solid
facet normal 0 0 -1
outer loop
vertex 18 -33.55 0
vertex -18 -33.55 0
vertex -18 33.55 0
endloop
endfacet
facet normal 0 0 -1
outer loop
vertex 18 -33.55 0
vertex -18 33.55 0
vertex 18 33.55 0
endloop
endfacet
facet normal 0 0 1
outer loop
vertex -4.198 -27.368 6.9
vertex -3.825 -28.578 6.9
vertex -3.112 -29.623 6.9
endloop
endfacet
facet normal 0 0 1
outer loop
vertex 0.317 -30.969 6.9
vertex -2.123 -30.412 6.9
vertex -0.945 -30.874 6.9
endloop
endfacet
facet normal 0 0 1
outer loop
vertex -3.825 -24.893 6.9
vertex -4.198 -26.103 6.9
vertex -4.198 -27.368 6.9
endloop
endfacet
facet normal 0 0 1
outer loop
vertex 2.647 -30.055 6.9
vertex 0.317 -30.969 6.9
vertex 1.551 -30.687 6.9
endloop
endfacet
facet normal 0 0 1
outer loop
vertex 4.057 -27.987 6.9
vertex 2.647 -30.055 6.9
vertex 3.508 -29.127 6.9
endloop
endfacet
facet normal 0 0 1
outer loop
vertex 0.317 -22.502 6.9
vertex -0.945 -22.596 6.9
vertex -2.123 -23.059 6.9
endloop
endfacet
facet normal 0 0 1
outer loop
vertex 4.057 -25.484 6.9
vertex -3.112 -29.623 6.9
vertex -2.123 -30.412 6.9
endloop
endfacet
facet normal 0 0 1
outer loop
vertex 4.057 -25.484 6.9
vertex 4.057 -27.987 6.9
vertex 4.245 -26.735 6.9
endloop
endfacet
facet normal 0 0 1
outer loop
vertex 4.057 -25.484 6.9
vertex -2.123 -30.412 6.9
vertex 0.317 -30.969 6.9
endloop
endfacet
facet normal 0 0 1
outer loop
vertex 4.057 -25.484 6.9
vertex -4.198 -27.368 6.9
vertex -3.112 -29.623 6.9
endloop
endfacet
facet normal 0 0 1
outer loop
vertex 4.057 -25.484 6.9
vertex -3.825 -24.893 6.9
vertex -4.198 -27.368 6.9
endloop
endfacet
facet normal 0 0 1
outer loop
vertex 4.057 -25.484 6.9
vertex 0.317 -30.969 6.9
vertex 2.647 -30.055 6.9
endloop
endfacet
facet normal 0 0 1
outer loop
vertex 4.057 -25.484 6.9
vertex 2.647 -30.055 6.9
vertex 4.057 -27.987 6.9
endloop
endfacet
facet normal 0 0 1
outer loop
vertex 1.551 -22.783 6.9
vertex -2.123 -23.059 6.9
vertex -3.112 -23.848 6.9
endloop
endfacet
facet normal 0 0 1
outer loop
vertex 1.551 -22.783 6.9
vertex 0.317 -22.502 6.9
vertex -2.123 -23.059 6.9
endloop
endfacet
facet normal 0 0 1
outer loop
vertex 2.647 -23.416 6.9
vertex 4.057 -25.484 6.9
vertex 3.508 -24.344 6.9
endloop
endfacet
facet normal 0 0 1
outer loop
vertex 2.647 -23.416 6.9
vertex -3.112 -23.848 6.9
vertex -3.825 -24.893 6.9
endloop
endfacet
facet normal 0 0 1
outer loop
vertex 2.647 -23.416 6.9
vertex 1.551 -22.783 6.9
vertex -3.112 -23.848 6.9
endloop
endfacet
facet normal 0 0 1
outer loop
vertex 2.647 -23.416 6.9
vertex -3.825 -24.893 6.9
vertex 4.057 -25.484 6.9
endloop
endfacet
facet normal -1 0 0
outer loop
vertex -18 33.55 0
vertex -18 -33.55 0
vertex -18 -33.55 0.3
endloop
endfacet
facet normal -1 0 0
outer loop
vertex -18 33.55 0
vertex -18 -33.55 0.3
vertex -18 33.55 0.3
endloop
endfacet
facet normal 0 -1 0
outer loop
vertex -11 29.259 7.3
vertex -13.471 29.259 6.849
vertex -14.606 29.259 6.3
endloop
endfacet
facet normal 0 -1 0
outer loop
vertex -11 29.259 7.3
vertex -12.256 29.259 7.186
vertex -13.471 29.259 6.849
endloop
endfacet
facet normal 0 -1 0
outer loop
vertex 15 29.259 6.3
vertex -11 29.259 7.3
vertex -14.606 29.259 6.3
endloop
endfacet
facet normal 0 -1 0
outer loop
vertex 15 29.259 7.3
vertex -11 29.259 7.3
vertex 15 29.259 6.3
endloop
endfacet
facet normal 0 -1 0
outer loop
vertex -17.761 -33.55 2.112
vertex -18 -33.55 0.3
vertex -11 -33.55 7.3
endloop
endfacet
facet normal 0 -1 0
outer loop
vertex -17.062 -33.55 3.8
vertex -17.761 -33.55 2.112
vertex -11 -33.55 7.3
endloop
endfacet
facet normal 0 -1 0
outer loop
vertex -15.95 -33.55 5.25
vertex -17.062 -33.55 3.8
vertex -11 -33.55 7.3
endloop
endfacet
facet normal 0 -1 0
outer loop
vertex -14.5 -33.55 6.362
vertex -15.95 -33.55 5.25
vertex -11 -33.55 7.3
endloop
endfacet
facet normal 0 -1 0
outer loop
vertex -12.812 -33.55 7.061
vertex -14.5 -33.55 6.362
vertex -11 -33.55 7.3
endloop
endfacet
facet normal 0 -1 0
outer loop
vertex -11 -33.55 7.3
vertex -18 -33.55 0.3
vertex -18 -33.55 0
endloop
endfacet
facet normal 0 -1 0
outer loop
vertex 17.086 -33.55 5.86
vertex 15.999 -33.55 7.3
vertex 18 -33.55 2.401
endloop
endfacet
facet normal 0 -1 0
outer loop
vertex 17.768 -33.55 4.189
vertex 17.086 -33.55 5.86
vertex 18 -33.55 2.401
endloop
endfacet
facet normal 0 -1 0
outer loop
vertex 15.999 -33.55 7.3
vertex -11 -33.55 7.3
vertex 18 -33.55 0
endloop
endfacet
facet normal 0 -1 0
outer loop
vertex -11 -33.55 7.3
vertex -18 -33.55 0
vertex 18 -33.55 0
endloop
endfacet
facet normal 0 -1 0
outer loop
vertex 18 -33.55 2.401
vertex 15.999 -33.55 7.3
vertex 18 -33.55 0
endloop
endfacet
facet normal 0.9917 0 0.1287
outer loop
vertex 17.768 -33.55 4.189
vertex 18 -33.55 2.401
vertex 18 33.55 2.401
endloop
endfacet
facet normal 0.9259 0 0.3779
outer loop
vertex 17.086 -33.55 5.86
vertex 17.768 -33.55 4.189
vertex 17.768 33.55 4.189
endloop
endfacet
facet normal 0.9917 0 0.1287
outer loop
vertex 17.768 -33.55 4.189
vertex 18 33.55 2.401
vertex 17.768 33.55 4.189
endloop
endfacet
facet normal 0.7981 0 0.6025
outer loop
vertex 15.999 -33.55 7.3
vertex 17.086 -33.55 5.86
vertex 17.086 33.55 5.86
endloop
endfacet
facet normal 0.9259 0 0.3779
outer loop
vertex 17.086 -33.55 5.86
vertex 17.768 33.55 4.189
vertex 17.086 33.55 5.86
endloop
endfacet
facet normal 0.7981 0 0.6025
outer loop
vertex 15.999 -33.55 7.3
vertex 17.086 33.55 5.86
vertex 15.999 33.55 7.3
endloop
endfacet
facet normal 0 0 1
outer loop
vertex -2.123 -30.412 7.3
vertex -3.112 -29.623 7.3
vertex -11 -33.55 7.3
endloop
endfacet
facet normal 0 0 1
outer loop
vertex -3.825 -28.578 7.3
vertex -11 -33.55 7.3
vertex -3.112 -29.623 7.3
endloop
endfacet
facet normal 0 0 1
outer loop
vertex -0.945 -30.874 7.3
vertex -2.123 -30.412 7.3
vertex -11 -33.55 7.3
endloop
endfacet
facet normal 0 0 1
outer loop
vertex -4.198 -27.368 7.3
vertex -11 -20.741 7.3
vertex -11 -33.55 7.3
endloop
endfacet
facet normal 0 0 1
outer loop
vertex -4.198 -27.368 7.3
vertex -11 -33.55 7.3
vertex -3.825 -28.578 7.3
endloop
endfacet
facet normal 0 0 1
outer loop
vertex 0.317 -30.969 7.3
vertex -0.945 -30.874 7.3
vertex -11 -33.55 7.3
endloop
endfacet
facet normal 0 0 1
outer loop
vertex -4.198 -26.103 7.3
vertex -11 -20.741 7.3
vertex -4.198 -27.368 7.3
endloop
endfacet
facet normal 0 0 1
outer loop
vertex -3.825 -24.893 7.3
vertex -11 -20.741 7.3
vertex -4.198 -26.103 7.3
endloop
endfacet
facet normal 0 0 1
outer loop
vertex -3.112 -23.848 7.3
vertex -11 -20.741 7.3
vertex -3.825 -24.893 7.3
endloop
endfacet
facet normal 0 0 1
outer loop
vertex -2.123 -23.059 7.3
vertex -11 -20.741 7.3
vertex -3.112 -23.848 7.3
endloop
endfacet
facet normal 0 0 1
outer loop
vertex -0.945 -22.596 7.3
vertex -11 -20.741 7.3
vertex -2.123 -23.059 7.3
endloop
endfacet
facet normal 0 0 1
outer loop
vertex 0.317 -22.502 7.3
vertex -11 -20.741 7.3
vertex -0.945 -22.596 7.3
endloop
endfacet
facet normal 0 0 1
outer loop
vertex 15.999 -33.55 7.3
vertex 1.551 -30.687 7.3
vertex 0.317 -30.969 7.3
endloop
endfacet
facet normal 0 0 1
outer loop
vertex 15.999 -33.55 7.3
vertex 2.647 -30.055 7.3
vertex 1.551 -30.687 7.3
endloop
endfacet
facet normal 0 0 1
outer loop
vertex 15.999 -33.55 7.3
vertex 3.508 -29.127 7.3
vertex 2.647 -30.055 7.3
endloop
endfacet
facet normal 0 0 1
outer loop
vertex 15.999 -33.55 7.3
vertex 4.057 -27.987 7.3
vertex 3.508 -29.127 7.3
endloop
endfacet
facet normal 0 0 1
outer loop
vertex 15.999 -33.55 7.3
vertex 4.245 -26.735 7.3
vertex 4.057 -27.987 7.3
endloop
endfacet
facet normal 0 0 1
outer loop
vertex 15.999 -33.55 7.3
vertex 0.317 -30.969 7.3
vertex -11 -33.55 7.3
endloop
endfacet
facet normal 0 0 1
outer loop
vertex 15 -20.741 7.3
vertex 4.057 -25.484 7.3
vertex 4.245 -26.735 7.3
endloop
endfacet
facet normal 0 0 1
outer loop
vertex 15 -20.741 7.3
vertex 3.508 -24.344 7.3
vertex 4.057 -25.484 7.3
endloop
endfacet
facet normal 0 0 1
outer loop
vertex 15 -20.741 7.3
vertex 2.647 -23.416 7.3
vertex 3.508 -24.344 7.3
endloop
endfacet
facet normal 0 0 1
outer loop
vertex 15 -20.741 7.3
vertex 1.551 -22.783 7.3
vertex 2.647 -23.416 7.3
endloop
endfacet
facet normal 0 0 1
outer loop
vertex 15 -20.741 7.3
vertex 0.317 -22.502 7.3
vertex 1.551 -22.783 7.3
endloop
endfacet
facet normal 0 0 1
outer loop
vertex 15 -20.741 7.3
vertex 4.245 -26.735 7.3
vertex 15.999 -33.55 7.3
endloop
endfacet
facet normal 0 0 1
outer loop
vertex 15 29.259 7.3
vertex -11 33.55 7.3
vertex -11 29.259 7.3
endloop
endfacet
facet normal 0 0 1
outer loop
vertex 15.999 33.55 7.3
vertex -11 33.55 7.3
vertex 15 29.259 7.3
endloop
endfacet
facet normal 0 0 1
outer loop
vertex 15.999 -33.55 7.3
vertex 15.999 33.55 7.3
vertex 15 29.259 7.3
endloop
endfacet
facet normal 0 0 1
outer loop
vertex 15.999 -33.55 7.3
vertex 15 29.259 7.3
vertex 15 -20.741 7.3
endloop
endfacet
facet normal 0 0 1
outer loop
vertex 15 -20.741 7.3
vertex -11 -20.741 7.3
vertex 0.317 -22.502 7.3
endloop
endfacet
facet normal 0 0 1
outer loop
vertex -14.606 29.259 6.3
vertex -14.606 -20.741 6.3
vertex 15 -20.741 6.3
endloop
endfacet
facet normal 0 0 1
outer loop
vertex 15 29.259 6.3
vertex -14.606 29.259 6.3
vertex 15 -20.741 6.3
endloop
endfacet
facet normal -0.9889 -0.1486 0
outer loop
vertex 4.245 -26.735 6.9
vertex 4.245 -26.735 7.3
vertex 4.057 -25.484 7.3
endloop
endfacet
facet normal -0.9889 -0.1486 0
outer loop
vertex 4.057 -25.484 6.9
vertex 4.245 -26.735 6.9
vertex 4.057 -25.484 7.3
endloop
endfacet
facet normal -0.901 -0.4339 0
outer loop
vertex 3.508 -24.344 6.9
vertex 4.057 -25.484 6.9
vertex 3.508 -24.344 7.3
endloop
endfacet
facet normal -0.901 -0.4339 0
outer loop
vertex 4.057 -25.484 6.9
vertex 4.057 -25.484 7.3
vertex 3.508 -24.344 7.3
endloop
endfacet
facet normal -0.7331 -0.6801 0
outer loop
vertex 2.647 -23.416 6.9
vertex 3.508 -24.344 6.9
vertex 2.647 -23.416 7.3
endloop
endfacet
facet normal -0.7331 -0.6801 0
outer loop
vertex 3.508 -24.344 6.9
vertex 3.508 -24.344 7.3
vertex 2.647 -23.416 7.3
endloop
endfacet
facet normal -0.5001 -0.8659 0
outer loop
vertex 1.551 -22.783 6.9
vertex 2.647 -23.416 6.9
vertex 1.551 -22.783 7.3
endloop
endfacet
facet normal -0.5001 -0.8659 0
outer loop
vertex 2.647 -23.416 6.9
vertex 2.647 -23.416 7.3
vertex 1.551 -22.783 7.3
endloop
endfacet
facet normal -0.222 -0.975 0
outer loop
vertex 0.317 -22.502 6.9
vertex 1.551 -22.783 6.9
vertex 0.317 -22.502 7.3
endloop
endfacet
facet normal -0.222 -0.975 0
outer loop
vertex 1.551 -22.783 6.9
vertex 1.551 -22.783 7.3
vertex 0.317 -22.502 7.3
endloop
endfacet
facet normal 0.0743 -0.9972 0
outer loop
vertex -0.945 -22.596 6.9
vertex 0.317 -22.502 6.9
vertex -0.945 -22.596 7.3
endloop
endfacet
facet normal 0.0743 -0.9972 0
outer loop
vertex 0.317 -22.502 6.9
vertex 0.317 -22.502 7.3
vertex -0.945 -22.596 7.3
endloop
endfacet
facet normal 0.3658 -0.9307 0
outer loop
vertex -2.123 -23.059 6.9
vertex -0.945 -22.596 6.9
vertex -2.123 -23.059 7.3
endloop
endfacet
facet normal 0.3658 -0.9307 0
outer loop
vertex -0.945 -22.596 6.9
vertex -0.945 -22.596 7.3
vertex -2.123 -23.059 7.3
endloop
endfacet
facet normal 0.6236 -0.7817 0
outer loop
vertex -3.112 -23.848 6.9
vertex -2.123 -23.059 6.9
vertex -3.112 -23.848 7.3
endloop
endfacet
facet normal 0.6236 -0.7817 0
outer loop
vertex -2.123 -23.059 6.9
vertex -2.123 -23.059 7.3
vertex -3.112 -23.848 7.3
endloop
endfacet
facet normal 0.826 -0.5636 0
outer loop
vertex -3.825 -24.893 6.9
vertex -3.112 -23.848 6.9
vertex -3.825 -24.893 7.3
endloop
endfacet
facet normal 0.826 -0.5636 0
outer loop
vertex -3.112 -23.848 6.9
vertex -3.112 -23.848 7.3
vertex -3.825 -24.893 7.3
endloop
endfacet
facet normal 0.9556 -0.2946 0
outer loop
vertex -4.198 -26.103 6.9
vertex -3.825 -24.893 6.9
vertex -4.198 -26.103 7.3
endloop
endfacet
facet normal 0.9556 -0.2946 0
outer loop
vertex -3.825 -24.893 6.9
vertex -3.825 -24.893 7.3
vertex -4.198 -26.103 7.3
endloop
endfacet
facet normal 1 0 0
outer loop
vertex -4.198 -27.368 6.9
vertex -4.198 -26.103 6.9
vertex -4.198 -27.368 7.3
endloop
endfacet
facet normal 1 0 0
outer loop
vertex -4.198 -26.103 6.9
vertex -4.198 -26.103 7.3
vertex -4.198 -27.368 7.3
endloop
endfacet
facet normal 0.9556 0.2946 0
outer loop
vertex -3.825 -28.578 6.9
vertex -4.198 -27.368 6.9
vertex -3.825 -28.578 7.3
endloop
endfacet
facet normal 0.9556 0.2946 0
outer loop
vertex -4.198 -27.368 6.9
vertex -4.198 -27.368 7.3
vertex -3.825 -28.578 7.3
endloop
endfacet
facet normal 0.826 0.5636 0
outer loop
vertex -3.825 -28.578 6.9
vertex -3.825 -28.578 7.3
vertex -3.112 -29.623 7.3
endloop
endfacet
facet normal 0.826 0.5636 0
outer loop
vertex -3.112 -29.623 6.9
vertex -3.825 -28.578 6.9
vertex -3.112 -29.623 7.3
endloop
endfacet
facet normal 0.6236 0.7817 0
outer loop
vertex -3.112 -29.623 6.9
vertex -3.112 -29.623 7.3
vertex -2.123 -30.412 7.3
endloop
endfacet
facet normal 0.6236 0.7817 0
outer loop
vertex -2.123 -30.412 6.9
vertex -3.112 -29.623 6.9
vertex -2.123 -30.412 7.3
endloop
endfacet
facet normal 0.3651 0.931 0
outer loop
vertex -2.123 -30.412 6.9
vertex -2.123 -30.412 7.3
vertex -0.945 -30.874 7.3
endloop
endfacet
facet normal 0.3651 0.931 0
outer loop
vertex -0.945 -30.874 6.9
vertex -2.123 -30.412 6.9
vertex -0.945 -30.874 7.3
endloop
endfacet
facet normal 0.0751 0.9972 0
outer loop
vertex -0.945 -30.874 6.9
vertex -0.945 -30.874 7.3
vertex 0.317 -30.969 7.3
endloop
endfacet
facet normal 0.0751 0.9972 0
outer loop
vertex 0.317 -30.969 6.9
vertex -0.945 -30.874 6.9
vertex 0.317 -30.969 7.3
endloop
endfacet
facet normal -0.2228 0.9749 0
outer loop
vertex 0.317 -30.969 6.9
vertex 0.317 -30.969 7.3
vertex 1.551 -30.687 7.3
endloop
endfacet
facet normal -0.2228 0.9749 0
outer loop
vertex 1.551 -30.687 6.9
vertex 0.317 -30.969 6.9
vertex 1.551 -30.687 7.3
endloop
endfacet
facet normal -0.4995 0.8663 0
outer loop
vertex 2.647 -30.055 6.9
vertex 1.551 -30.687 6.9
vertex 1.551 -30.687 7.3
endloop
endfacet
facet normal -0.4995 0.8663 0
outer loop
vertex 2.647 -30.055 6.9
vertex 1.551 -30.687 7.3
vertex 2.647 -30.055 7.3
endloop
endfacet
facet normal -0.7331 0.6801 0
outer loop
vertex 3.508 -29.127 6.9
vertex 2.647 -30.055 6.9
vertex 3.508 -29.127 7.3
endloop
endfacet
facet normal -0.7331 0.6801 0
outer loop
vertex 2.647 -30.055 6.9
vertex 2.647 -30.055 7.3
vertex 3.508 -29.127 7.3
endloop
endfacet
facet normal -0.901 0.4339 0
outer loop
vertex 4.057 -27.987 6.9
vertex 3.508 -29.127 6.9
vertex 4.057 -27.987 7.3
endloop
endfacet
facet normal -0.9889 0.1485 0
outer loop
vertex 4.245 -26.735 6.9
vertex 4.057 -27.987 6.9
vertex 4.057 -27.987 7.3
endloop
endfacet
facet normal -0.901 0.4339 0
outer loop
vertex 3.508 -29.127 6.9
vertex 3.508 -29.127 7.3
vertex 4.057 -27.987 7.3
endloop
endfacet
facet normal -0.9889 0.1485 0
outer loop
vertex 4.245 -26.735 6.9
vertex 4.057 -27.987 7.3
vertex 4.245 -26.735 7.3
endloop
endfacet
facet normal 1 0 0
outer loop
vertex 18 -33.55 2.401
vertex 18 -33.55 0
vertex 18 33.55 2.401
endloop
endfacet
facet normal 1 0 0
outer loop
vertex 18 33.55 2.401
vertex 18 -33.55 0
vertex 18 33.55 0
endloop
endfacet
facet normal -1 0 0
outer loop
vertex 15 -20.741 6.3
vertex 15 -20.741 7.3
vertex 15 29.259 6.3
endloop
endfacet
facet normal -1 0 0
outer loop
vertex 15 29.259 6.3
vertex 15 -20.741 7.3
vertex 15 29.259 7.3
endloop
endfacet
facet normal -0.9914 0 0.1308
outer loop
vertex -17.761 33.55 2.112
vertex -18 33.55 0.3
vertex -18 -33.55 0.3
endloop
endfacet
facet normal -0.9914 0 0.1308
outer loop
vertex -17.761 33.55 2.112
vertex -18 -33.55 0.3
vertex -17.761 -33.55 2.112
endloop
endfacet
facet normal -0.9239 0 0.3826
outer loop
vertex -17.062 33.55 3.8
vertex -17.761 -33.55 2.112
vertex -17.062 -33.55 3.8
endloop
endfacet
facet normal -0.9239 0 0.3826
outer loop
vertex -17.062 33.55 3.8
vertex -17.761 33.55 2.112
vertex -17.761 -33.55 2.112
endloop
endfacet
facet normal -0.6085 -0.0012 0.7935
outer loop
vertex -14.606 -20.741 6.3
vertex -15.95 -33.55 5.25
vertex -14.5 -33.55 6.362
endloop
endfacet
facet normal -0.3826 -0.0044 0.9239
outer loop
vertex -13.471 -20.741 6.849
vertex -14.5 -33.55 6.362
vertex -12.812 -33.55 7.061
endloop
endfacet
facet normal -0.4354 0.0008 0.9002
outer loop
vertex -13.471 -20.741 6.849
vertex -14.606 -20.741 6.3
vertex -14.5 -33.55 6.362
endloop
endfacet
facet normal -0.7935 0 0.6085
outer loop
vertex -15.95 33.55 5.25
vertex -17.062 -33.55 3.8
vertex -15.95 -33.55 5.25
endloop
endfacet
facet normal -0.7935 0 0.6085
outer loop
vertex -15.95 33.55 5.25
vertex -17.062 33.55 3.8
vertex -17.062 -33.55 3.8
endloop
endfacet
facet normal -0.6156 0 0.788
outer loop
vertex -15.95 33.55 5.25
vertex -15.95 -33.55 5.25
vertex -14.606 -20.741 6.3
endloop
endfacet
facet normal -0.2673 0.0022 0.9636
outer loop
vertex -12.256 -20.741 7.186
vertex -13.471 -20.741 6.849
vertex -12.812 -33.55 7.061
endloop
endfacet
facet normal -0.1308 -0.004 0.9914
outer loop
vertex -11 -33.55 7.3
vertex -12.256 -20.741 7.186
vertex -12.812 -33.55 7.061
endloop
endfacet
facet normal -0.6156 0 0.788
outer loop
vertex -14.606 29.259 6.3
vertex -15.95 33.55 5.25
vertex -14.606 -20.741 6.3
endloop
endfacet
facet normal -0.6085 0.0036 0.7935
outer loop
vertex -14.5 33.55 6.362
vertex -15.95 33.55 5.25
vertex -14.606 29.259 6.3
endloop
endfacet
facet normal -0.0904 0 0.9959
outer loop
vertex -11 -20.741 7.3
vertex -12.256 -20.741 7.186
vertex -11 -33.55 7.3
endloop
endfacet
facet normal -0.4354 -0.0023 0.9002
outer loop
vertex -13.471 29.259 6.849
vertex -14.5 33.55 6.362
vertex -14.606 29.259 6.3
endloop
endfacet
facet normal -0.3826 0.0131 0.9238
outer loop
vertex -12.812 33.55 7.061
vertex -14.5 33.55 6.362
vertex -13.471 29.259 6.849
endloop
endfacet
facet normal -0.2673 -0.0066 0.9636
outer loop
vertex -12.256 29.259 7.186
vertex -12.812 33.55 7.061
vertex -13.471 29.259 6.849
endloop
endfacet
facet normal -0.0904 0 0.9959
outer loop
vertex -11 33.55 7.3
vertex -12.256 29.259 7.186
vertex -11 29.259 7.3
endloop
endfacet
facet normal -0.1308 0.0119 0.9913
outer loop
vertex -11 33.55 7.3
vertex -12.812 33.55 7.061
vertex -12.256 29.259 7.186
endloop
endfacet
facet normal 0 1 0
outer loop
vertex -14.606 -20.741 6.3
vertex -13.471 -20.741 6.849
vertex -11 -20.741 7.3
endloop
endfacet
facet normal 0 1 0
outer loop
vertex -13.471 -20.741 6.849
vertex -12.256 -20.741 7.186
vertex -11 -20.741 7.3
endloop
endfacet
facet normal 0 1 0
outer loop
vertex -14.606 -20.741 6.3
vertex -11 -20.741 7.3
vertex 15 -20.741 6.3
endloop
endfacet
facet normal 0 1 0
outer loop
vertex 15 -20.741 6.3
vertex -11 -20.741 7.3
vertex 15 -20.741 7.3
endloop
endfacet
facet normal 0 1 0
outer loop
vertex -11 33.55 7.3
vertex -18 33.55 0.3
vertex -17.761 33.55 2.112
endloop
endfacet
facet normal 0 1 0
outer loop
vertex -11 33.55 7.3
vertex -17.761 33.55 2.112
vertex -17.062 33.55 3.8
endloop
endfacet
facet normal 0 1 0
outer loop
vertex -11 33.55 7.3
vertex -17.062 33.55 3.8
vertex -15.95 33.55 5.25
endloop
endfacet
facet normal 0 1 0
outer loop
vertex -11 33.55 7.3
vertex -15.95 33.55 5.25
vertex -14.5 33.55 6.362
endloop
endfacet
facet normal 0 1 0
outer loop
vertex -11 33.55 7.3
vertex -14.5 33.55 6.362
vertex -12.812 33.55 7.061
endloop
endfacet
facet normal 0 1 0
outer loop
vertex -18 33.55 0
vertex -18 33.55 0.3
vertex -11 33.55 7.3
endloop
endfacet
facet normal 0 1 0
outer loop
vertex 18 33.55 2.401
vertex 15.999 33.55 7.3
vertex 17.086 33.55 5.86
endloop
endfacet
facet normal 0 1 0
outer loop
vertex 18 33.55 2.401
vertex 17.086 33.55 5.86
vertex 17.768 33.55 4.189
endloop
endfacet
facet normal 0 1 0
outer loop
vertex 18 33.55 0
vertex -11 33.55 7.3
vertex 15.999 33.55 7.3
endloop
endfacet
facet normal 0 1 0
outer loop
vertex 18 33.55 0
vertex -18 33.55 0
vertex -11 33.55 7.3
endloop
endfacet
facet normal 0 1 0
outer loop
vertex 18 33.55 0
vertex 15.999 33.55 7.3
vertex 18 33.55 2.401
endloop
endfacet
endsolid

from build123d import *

# Parameters (mm, degrees)
F0_W        = 36
F0_H        = 67.1
F1_DEPTH    = 7.3
F2_R        = 4.2454518292
F3_DEPTH    = 0.4
F5_SIZE     = 2
F6_T1_DEPTH = 81.5974746831
F4_W        = 30
F4_H        = 50
F7_DEPTH    = 1
F8_T1_DEPTH = 102.1


# Not quite as in the source:
# - a fillet or chamfer that OpenCascade refuses, or shapes differently, is made with other operations: its cross-section is extruded or revolved along the edge and cut away or added


with BuildPart() as f1:
    # F0 (on Top) → F1 (new body)
    with BuildSketch(Plane.XY):
        Rectangle(F0_W, F0_H)
    extrude(amount=F1_DEPTH)

    # F2 (on face) → F3 (cut)
    with BuildSketch(Plane.XY.offset(7.3)):
        with Locations((0, -26.7354752868)):
            Circle(F2_R)
    extrude(amount=-F3_DEPTH, mode=Mode.SUBTRACT)

    # F5
    f5_edges = [f1.edges().sort_by_distance(p)[0] for p in [
        (18, 0, 7.3),
    ]]
    chamfer(f5_edges, length=F5_SIZE)

    # F6: fillet of radius 7 on 1 edges, made by hand

    # F6_s2 → F6_t1 (cut)
    with BuildSketch(Plane.XZ.offset(-40.7987373415)):
        with BuildLine():
            ThreePointArc((18, 2.4005050634), (17.4671567276, 5.0792890899), (15.9497474683, 7.3502525317))
            Line((15.9497474683, 7.3502525317), (18, 5.3))
            Line((18, 5.3), (18, 2.4005050634))
        make_face()
    extrude(amount=F6_T1_DEPTH, mode=Mode.SUBTRACT)

    # F4 (on face) → F7 (cut)
    with BuildSketch(Plane.XY.offset(7.3)):
        with Locations((0, 4.2591368308)):
            Rectangle(F4_W, F4_H)
    extrude(amount=-F7_DEPTH, mode=Mode.SUBTRACT)

    # F8: fillet of radius 7 on 1 edges, made by hand

    # F8_s2 → F8_t1 (cut)
    with BuildSketch(Plane.XZ.offset(-51.05)):
        with BuildLine():
            ThreePointArc((-18, 0.3), (-15.9497474683, 5.2497474683), (-11, 7.3))
            Line((-11, 7.3), (-18, 7.3))
            Line((-18, 7.3), (-18, 0.3))
        make_face()
    extrude(amount=F8_T1_DEPTH, mode=Mode.SUBTRACT)


solid = f1.part
